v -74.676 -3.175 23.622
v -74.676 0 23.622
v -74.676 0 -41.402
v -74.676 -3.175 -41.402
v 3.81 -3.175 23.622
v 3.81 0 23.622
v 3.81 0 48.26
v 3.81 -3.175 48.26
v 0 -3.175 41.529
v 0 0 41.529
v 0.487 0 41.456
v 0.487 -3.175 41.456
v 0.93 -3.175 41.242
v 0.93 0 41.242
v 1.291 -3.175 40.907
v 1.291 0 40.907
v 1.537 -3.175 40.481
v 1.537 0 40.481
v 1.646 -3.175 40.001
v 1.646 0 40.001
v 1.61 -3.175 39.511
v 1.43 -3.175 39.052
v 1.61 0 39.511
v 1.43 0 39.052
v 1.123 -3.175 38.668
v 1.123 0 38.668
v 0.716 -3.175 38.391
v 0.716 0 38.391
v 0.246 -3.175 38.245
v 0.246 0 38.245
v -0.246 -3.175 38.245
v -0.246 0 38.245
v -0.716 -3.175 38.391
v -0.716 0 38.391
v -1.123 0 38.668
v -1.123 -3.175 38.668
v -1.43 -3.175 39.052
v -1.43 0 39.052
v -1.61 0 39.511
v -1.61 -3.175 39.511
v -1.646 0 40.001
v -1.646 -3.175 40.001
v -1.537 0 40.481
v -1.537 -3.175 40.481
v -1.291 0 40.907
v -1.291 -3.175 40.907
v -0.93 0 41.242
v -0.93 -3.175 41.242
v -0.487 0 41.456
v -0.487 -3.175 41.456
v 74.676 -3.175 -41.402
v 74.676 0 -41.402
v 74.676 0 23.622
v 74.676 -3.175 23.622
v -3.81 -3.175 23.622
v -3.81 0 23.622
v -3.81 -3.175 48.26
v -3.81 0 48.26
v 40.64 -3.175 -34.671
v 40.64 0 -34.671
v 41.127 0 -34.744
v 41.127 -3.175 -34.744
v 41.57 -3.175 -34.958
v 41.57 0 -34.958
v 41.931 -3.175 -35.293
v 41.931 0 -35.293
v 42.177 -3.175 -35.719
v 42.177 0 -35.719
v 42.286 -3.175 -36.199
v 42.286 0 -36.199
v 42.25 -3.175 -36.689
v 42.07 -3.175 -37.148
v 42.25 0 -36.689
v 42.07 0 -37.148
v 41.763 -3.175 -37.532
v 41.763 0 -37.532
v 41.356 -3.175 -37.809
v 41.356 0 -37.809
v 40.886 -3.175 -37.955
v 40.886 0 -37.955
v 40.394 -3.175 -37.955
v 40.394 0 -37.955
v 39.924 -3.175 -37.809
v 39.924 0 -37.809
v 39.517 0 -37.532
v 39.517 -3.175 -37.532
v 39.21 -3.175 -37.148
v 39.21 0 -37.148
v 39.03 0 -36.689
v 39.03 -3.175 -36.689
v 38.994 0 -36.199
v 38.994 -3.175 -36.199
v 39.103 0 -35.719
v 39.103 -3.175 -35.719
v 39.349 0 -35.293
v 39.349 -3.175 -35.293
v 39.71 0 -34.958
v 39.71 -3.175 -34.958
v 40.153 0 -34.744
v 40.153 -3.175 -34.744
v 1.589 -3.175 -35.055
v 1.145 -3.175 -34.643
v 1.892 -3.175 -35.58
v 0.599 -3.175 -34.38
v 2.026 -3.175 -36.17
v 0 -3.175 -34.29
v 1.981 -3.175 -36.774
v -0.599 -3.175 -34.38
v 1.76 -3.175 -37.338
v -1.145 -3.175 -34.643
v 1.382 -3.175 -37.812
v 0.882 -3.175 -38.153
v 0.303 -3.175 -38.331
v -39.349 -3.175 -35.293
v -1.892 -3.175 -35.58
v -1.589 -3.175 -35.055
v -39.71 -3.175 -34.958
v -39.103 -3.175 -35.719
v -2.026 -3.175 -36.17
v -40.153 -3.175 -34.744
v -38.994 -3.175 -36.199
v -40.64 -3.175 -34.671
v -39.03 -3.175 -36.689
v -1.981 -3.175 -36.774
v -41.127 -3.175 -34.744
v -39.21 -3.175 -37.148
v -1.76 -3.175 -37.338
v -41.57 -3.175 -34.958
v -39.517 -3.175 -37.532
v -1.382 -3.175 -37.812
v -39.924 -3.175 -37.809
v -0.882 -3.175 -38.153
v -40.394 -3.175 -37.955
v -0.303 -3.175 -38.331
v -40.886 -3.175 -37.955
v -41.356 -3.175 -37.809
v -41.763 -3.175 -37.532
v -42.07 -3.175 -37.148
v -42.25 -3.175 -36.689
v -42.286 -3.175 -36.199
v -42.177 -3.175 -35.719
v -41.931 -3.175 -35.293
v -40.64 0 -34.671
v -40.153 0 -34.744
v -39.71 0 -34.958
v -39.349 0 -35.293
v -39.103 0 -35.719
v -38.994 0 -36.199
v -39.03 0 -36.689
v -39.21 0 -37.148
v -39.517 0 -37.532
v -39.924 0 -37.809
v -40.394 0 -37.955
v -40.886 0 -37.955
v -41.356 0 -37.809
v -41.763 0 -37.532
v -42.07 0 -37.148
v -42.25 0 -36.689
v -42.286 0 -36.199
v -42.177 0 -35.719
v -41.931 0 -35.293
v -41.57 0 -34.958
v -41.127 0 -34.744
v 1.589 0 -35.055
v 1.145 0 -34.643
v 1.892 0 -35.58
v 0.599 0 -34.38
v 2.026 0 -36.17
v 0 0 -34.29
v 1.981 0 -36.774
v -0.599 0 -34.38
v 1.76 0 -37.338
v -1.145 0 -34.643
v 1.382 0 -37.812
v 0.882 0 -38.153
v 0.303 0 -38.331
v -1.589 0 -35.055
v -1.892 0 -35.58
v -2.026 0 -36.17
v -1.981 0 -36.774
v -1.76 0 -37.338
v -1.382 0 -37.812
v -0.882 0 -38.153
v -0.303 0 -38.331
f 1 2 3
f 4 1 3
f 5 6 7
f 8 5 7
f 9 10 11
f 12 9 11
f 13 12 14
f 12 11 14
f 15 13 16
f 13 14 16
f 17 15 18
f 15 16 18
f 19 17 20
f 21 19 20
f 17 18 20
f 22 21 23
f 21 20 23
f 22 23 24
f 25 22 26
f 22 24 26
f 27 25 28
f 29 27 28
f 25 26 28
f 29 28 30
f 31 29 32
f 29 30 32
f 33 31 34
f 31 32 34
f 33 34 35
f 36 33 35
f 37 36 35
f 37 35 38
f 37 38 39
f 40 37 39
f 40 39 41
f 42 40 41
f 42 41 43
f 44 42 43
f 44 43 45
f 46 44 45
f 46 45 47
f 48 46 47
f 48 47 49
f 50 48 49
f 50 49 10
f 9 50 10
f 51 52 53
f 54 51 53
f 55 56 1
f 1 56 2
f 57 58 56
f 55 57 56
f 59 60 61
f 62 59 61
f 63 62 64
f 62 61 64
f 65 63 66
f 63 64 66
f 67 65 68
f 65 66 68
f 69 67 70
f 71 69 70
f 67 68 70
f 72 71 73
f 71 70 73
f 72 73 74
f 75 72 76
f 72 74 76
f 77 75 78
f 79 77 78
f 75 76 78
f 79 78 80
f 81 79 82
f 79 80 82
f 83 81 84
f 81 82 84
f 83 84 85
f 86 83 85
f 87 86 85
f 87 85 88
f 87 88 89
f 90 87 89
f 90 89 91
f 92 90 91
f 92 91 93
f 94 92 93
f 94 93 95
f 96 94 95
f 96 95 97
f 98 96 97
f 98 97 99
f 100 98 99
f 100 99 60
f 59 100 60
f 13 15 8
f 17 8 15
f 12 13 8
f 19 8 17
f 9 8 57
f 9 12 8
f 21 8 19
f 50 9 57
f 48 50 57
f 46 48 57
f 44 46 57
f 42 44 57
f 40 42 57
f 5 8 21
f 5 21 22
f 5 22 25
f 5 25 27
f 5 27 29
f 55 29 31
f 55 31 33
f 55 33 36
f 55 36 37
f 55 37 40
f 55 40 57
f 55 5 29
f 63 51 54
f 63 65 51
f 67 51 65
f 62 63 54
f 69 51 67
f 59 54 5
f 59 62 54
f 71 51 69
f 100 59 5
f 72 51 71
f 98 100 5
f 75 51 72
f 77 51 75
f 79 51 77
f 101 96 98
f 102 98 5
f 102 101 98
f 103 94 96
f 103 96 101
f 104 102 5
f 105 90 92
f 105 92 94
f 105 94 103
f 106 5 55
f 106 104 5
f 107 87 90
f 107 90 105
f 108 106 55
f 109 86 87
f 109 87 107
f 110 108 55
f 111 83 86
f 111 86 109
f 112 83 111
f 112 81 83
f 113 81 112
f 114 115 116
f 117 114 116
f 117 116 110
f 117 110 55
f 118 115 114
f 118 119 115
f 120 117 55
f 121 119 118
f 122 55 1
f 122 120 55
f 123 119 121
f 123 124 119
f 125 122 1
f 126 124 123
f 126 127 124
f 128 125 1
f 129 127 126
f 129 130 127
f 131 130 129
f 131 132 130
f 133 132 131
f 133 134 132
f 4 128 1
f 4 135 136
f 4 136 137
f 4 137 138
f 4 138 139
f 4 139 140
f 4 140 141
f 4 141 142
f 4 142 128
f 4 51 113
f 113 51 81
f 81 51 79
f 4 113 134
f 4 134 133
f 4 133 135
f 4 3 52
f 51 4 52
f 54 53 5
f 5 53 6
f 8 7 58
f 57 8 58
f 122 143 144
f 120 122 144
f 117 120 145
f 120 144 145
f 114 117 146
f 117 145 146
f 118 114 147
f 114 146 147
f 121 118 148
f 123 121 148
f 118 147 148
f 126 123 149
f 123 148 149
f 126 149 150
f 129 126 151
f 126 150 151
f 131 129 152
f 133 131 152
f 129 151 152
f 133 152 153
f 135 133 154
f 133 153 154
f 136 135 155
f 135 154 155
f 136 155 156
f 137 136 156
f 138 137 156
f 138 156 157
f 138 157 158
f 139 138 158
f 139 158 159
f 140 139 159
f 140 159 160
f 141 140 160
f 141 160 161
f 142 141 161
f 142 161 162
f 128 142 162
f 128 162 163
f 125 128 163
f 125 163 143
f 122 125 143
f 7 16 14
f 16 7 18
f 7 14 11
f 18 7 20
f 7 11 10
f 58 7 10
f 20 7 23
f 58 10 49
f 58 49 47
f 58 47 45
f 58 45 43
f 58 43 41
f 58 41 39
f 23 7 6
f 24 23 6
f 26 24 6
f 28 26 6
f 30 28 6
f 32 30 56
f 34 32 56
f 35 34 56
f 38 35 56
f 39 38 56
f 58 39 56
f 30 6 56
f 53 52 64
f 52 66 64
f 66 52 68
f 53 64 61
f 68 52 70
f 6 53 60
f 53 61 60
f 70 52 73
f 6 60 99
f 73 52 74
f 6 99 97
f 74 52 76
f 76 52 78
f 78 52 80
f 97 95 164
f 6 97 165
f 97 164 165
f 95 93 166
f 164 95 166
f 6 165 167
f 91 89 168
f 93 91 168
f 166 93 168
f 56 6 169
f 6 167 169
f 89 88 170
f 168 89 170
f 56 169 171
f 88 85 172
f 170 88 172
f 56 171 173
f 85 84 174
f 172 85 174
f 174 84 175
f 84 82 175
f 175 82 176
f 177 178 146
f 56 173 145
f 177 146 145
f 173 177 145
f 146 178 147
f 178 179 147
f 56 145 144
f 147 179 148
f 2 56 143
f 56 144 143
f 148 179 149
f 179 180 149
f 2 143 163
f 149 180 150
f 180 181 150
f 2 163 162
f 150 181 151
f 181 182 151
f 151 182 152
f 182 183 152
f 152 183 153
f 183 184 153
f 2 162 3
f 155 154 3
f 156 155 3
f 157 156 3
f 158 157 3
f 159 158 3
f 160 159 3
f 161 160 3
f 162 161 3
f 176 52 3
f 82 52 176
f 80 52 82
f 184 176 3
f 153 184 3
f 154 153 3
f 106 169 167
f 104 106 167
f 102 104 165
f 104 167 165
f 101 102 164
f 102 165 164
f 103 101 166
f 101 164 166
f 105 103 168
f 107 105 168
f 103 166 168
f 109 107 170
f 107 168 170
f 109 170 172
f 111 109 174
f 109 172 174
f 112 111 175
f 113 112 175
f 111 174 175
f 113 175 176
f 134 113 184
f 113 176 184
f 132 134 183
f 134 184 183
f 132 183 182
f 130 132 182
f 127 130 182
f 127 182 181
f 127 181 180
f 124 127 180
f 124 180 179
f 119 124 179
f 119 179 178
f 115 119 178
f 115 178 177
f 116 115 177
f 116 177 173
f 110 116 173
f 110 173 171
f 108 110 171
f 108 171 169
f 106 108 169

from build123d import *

# Parameters (mm, degrees)
BOSS_EXTRUDE1_DEPTH = 3.175
SKETCH2_R           = 1.651
SKETCH2_R_2         = 2.032
CUT_EXTRUDE1_DEPTH  = 89.969731937


with BuildPart() as part:
    # Sketch1 → Boss-Extrude1 (new body)
    with BuildSketch(Plane(origin=(0, 0, 0), x_dir=(1, 0, 0), z_dir=(0, 1, 0))):
        Polygon((-74.676, 41.402), (74.676, 41.402), (74.676, -23.622), (3.81, -23.622), (3.81, -48.26), (-3.81, -48.26), (-3.81, -23.622), (-74.676, -23.622), align=None)
    extrude(amount=-BOSS_EXTRUDE1_DEPTH)

    # Sketch2 → Cut-Extrude1 (cut, through all)
    with BuildSketch(Plane(origin=(0, 0, 0), x_dir=(1, 0, 0), z_dir=(0, 1, 0))):
        with Locations(Location((-40.64, 36.322, 0), (0, 0, 270))):
            Circle(SKETCH2_R)
        with Locations(Location((0, 36.322, 0), (0, 0, 270))):
            Circle(SKETCH2_R_2)
        with Locations(Location((40.64, 36.322, 0), (0, 0, 270))):
            Circle(SKETCH2_R)
        with Locations(Location((0, -39.878, 0), (0, 0, 270))):
            Circle(SKETCH2_R)
    extrude(amount=-CUT_EXTRUDE1_DEPTH, mode=Mode.SUBTRACT)


solid = part.part
